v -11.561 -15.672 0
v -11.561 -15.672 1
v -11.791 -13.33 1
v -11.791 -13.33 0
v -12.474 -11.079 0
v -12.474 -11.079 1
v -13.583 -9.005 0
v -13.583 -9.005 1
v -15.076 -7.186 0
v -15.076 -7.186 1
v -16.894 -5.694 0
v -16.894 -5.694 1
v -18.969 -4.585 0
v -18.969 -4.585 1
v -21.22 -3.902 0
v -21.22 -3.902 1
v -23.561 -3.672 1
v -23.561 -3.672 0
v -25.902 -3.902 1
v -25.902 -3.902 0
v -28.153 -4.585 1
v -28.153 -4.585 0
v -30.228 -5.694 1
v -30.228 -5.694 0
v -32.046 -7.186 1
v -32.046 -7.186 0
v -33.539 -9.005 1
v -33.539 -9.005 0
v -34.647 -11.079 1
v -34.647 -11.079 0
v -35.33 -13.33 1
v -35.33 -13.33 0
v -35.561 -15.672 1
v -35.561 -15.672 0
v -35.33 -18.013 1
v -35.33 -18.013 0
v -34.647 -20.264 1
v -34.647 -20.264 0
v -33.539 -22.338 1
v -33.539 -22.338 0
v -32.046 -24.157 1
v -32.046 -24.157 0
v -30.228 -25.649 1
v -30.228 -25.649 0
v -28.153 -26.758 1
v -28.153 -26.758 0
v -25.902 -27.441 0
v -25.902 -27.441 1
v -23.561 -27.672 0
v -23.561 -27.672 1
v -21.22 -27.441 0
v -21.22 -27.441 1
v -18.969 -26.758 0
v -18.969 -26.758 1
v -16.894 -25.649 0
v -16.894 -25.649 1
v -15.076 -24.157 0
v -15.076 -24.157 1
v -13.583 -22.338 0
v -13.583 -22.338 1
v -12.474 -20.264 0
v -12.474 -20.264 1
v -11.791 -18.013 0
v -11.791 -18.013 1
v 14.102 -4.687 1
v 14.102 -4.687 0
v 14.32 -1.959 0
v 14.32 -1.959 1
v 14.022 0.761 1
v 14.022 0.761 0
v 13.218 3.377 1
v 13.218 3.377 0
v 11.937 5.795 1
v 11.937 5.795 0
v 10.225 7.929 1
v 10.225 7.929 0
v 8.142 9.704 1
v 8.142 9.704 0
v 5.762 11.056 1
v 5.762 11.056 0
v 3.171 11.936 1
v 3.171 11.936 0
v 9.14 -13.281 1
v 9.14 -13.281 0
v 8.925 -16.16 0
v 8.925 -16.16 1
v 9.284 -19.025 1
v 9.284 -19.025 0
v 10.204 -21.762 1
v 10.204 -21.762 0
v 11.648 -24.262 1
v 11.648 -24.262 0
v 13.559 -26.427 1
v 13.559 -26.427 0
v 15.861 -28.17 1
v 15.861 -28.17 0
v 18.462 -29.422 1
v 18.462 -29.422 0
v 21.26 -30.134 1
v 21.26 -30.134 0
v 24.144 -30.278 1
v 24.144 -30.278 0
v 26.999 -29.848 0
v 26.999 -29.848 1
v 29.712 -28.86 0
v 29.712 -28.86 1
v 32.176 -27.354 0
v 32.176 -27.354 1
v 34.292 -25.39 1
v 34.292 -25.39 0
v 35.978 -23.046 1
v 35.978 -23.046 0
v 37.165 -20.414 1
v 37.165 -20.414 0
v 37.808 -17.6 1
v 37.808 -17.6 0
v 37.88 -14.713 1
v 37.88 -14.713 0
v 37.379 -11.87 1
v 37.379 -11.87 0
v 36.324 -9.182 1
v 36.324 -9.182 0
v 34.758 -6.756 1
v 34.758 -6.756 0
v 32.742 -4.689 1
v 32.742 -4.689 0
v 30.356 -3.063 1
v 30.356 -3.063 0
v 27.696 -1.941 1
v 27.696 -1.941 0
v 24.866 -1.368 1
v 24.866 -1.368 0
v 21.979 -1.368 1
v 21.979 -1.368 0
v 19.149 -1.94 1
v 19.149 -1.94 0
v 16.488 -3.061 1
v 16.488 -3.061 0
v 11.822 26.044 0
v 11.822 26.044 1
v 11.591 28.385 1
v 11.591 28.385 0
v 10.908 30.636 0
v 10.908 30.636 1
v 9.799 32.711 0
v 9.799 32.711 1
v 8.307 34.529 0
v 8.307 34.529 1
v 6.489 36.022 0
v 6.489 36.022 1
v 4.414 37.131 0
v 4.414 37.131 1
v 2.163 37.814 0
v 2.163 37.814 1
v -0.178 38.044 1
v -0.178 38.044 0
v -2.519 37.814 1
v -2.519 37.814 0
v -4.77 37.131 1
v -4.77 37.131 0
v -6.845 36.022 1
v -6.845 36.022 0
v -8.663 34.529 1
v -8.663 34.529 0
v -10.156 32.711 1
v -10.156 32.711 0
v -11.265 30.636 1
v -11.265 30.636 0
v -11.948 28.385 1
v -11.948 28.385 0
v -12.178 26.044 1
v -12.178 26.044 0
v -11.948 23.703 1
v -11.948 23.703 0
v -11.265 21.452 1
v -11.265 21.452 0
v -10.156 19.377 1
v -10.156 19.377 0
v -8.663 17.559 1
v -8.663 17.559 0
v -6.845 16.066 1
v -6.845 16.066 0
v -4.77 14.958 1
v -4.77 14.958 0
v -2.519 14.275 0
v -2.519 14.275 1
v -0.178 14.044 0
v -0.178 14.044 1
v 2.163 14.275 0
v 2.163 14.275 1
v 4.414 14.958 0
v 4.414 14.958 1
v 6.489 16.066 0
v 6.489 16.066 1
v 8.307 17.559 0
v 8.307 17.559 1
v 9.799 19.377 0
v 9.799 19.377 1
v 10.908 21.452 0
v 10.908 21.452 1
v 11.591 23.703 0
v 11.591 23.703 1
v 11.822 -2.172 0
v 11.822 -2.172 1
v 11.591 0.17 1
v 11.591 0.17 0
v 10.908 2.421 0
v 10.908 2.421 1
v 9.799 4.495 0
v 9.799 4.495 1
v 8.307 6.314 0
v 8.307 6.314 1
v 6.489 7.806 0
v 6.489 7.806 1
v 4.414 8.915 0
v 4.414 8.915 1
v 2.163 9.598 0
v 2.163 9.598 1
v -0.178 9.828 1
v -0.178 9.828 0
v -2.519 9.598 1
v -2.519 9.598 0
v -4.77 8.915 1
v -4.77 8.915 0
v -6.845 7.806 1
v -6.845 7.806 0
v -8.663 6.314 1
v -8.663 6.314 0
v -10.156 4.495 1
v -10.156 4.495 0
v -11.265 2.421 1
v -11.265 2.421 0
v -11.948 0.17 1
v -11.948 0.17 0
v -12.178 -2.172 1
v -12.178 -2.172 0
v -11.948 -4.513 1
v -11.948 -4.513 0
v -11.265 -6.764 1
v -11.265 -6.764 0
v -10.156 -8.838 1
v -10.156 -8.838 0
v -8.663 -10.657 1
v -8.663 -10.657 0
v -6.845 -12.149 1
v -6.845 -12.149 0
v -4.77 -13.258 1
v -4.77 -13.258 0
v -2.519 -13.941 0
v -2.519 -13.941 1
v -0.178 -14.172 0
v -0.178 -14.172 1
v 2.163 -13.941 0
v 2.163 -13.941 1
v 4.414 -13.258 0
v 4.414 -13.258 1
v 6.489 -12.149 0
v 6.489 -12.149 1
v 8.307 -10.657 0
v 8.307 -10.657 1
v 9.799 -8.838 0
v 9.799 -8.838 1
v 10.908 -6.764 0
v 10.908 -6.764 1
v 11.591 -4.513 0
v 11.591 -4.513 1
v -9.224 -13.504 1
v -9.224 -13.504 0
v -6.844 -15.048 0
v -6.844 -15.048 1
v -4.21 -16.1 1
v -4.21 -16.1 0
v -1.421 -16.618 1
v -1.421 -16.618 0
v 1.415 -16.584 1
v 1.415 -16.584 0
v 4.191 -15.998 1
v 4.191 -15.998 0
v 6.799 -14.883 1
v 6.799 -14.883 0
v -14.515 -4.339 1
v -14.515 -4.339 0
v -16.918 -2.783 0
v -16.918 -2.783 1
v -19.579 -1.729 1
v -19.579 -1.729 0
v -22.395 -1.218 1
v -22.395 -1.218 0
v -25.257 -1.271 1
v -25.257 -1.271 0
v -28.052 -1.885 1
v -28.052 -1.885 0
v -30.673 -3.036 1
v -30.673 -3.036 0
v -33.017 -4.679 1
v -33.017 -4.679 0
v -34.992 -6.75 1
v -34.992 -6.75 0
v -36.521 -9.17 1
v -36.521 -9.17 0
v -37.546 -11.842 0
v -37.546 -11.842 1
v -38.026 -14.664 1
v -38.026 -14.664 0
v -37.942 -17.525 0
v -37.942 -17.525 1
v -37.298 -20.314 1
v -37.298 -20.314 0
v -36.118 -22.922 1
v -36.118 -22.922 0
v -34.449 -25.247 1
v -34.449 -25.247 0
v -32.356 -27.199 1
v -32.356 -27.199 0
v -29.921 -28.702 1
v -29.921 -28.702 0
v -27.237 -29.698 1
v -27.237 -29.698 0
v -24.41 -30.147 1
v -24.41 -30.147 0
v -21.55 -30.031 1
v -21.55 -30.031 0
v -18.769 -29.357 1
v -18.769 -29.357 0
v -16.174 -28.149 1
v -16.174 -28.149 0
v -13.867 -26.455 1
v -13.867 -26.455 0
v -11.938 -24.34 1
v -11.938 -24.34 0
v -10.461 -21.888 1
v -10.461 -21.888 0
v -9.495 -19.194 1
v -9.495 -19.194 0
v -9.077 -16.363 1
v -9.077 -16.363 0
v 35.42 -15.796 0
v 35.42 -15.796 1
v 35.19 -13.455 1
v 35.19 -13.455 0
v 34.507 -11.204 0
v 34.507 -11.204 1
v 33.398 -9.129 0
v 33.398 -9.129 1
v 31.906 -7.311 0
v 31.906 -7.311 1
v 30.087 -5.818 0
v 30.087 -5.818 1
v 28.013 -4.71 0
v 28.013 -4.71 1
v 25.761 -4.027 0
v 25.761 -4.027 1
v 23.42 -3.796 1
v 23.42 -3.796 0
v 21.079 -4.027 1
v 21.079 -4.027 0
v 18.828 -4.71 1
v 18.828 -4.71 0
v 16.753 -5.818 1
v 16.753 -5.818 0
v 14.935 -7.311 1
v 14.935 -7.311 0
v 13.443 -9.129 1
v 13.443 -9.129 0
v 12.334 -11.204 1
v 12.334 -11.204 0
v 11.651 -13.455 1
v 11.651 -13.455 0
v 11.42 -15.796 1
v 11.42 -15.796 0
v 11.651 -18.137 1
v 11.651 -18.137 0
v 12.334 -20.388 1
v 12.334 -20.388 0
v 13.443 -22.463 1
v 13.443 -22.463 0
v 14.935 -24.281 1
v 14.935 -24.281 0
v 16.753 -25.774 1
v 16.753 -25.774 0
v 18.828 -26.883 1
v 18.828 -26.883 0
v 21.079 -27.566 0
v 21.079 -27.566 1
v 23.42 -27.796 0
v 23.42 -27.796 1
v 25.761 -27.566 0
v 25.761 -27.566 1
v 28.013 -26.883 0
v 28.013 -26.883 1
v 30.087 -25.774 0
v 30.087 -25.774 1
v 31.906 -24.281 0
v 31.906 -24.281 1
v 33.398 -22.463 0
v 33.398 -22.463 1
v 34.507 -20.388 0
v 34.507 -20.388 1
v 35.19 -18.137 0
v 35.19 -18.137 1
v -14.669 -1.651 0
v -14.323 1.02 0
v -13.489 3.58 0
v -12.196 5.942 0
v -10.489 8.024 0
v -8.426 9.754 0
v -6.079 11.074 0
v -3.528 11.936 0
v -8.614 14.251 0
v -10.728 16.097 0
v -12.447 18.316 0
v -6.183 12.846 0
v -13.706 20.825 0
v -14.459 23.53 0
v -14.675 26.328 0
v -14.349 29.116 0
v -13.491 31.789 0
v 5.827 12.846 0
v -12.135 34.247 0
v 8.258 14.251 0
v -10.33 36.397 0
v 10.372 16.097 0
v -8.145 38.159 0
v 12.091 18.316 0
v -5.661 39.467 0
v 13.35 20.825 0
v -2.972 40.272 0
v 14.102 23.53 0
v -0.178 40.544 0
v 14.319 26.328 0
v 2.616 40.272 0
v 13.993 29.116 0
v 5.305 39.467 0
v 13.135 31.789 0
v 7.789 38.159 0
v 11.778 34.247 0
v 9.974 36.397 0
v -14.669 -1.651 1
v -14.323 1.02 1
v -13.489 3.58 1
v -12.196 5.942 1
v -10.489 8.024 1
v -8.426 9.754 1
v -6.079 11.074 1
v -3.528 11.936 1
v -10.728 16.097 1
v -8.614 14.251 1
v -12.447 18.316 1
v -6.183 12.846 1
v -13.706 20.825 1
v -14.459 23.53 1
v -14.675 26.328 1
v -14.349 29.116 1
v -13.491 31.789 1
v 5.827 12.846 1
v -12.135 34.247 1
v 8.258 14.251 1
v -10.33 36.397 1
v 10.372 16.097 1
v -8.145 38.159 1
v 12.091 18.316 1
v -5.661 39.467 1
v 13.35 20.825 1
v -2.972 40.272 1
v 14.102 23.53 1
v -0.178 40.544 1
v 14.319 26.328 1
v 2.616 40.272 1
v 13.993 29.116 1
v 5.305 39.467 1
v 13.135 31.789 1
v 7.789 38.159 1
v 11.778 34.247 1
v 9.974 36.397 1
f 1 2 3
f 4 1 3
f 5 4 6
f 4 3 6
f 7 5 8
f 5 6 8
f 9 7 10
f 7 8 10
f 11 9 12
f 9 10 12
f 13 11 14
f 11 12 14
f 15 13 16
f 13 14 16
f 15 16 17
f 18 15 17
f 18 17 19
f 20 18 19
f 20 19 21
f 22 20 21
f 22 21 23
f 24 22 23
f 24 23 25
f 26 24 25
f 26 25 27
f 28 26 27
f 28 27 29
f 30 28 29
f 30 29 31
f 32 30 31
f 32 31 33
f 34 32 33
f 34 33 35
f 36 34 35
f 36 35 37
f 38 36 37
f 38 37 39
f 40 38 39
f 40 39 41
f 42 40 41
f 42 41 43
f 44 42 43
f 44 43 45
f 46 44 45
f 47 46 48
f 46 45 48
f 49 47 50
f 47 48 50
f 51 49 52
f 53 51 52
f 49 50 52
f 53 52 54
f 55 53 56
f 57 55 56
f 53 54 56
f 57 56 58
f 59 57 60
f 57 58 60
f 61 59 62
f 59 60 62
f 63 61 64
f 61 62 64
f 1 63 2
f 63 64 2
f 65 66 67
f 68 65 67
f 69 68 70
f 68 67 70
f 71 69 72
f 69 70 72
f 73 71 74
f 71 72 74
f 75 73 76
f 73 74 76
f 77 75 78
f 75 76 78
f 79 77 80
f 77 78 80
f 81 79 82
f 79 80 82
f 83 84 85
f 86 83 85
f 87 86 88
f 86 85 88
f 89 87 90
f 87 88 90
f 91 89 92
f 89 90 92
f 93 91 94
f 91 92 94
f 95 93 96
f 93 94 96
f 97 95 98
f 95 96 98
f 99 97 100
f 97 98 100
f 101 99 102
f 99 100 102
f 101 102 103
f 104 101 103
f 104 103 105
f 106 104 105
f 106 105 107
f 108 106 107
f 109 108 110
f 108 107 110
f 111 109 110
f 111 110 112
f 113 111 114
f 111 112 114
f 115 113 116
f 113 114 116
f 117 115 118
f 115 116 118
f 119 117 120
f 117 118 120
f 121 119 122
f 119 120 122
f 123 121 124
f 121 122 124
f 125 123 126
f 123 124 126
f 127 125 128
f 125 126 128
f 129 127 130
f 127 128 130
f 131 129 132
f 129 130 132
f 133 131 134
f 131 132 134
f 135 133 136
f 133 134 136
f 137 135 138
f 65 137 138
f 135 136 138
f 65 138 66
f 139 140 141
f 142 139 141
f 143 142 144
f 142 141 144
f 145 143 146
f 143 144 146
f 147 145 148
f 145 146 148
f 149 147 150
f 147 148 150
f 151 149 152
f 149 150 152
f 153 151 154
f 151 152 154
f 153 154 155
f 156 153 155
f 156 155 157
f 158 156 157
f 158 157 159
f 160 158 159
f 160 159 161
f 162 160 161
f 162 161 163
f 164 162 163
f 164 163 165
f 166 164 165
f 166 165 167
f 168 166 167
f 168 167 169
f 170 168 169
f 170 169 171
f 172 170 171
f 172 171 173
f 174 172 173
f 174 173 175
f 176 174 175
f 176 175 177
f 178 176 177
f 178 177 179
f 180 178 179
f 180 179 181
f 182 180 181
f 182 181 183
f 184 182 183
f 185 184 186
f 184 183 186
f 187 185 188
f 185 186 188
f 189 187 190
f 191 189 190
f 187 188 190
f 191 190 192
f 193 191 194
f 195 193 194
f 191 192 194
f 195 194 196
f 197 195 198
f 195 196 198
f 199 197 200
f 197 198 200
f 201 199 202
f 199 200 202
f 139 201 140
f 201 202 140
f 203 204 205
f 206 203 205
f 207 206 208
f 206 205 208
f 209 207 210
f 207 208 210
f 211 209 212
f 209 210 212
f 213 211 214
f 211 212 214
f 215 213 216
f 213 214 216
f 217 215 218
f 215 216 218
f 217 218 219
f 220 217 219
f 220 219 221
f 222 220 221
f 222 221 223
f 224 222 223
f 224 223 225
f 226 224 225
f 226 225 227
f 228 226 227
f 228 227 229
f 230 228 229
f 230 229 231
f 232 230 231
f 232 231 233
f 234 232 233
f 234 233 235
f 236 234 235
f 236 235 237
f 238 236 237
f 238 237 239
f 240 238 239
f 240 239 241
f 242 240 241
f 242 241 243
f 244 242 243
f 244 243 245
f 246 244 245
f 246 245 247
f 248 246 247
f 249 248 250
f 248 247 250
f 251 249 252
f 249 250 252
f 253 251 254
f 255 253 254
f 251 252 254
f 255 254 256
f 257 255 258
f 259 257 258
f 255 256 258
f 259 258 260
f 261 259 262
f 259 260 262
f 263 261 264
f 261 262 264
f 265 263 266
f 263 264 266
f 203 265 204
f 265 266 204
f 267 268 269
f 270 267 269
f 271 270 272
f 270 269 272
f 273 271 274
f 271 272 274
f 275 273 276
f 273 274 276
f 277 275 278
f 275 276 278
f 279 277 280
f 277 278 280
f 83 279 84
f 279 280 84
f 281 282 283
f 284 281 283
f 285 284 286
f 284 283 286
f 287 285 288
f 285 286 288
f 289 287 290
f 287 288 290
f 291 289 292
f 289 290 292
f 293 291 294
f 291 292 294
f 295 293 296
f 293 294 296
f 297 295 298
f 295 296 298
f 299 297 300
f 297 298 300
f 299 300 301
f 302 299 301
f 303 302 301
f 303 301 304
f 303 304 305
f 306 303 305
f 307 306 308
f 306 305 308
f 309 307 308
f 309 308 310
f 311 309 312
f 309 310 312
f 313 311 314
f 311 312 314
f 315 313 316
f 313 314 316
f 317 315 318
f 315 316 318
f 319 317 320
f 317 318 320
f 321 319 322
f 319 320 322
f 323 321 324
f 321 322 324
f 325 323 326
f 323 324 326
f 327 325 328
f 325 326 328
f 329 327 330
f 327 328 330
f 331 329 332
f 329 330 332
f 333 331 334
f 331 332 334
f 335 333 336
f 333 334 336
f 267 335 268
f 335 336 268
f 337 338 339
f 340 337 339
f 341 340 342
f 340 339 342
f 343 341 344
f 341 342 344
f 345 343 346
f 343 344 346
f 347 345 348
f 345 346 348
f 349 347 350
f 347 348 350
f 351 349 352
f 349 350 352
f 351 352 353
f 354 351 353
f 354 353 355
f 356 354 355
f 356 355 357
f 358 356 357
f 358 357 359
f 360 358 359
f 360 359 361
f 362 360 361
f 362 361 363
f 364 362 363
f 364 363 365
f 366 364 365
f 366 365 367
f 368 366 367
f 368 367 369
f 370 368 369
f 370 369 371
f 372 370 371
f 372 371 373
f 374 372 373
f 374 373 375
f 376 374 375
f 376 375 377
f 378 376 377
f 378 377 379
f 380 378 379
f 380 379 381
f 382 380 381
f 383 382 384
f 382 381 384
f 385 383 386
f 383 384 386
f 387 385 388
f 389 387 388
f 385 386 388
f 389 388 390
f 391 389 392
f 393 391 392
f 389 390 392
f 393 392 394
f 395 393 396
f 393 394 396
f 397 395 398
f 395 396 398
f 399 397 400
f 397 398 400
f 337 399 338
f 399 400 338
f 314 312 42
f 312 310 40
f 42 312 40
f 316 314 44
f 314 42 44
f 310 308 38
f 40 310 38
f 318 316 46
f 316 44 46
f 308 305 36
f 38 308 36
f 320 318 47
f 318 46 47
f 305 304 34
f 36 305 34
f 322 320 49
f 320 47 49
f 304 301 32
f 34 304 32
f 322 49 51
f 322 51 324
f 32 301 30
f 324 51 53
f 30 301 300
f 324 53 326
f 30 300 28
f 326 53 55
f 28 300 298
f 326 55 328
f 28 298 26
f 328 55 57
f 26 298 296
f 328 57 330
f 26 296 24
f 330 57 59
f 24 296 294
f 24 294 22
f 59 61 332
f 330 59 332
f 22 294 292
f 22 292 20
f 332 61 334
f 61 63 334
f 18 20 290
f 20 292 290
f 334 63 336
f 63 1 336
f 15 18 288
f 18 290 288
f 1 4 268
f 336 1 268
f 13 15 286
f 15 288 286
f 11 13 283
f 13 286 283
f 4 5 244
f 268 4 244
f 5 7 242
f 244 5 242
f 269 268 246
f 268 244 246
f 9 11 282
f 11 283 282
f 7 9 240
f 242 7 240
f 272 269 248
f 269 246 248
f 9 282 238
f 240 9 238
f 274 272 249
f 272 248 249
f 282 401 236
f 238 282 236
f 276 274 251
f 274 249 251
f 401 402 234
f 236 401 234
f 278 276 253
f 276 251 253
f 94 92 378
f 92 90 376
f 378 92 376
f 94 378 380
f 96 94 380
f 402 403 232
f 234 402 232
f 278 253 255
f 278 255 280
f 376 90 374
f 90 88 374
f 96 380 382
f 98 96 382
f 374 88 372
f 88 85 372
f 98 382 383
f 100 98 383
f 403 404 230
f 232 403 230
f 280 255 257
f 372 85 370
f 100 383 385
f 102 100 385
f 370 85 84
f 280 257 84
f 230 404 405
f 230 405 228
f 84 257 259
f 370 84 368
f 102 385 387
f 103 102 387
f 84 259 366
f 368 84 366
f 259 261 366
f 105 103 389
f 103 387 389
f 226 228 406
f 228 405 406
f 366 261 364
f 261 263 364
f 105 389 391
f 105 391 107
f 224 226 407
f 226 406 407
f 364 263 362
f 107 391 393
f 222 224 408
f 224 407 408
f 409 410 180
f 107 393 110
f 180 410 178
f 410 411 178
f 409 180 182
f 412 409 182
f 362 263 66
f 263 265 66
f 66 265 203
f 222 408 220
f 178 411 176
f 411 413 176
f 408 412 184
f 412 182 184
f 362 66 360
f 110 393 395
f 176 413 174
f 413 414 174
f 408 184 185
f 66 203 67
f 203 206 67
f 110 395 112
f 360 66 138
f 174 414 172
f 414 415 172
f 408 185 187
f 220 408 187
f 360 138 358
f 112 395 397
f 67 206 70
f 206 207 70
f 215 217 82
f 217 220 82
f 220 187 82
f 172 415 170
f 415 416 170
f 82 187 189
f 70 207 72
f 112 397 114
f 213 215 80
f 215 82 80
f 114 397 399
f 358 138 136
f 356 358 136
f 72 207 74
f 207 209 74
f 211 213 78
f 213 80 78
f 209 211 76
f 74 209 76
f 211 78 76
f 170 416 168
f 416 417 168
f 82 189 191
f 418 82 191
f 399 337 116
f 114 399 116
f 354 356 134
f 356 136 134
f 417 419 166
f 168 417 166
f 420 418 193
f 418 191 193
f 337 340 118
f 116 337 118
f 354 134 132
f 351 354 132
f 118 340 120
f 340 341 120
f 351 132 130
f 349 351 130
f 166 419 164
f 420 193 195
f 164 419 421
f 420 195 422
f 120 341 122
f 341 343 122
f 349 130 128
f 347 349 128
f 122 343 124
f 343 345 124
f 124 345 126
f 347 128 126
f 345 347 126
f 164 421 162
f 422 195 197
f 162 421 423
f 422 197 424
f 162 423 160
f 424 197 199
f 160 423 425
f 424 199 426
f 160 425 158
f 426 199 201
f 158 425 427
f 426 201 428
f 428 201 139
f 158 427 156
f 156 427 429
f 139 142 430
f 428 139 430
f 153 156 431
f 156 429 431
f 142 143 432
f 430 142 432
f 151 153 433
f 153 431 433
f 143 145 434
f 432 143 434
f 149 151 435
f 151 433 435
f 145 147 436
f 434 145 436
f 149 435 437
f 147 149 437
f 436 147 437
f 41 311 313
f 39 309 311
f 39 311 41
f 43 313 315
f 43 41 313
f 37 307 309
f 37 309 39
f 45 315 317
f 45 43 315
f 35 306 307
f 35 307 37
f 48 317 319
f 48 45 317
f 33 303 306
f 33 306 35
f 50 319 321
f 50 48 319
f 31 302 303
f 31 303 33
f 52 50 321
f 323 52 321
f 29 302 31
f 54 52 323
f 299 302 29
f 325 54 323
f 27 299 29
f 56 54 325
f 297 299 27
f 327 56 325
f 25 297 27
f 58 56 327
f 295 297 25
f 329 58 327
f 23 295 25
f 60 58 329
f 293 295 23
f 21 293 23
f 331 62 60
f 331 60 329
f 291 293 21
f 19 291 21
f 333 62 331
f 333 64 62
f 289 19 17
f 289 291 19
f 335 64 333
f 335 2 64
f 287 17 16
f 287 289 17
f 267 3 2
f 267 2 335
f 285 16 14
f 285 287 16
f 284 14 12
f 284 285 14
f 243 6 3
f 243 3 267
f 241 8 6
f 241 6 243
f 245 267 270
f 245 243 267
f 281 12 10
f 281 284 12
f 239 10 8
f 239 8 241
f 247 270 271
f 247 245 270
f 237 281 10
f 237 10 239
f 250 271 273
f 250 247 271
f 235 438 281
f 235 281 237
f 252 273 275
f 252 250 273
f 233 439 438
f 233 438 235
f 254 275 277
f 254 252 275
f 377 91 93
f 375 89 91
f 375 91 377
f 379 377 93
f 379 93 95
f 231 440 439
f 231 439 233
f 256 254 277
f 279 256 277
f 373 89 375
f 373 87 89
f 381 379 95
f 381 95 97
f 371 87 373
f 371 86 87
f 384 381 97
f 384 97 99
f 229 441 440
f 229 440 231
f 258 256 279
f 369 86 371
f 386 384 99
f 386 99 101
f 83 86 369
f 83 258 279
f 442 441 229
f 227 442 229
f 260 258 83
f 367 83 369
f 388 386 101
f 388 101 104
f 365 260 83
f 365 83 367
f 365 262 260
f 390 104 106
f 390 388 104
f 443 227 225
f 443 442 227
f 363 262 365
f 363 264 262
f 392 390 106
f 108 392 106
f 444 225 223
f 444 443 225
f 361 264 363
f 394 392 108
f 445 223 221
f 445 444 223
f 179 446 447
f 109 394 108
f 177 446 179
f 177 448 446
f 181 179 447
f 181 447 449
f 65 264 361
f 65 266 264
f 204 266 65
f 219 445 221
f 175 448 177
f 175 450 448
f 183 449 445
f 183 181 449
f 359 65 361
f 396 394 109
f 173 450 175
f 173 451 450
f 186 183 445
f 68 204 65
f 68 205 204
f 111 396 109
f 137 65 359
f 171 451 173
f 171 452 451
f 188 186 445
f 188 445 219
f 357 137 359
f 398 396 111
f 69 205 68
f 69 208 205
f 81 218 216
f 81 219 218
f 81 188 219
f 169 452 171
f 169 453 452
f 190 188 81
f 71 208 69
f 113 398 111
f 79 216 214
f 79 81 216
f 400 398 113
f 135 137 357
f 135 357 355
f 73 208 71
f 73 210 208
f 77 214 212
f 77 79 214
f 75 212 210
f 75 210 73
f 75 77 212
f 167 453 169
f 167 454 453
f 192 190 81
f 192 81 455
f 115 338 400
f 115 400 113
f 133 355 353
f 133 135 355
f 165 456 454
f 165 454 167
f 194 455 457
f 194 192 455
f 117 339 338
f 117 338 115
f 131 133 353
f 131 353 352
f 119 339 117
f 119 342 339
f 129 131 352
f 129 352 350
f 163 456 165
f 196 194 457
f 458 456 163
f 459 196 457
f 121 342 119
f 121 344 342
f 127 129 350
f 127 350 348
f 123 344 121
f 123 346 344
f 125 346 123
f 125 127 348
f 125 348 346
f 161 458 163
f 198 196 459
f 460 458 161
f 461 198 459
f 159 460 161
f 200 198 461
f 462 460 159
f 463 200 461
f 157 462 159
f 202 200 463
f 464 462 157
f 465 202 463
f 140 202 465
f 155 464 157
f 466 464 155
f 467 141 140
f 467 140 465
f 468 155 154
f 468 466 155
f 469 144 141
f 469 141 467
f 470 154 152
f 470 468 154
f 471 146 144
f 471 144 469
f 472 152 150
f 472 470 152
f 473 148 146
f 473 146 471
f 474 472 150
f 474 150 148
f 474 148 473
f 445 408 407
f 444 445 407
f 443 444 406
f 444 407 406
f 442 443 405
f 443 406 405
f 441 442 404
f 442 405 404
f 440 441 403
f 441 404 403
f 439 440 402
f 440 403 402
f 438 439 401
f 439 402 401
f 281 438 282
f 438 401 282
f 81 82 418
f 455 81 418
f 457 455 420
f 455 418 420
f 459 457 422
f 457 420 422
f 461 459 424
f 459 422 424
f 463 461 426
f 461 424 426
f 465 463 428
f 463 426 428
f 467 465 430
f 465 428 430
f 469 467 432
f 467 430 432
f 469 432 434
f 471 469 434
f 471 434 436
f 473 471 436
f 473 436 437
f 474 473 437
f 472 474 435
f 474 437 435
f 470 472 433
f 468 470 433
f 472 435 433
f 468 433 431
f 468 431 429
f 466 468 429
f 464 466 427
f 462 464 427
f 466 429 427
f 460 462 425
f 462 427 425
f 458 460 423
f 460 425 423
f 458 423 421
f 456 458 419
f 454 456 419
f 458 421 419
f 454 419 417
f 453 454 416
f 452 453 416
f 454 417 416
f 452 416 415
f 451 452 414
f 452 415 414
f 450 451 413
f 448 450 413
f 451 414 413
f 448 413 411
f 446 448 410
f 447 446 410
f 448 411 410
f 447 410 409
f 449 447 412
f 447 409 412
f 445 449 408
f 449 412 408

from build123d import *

# Parameters (mm, degrees)
F0_R     = 11
F1_DEPTH = 1
F2_R     = 12
F3_DEPTH = 25


with BuildPart() as f1:
    # F0 (on Top) → F1 (new body)
    with BuildSketch(Plane.XY):
        with BuildLine():
            ThreePointArc((-0.178199, 8.828474), (-7.956373, -9.949701), (10.821801, -2.171526))
            ThreePointArc((10.821801, -2.171526), (7.599976, 5.606648), (-0.178199, 8.828474))
        make_face()
        with BuildLine():
            ThreePointArc((-14.515293, -4.33895), (-36.118253, -22.921526), (-9.22379, -13.504102))
            ThreePointArc((-9.22379, -13.504102), (-0.002001, -16.670456), (9.140118, -13.280935))
            ThreePointArc((9.140118, -13.280935), (35.977676, -23.04613), (14.10199, -4.686721))
            ThreePointArc((14.10199, -4.686721), (11.937225, 5.795061), (3.171414, 11.936276))
            ThreePointArc((3.171414, 11.936276), (-0.178199, 40.544079), (-3.527811, 11.936276))
            ThreePointArc((-3.527811, 11.936276), (-12.195921, 5.941694), (-14.515293, -4.33895))
        make_face()
        with Locations((-23.560884, -15.671526)):
            Circle(F0_R, mode=Mode.SUBTRACT)
        with BuildLine():
            ThreePointArc((-0.178199, 8.828474), (7.599976, 5.606648), (10.821801, -2.171526))
            ThreePointArc((10.821801, -2.171526), (-7.956373, -9.949701), (-0.178199, 8.828474))
        make_face(mode=Mode.SUBTRACT)
        with Locations((23.420307, -15.79613)):
            Circle(F0_R, mode=Mode.SUBTRACT)
        with BuildLine():
            ThreePointArc((-0.178199, 15.044079), (-7.956373, 33.822254), (10.821801, 26.044079))
            ThreePointArc((10.821801, 26.044079), (7.599976, 18.265904), (-0.178199, 15.044079))
        make_face(mode=Mode.SUBTRACT)
    extrude(amount=F1_DEPTH)

    # F2 (on face) → F3 (cut)
    with BuildSketch(Plane.XY.offset(1)):
        with Locations((-0.178199, 26.044079)):
            Circle(F2_R)
        with Locations((-0.178199, -2.171526)):
            Circle(F2_R)
        with Locations((23.420307, -15.79613)):
            Circle(F2_R)
        with Locations((-23.560884, -15.671526)):
            Circle(F2_R)
    extrude(amount=-F3_DEPTH, mode=Mode.SUBTRACT)


solid = f1.part
